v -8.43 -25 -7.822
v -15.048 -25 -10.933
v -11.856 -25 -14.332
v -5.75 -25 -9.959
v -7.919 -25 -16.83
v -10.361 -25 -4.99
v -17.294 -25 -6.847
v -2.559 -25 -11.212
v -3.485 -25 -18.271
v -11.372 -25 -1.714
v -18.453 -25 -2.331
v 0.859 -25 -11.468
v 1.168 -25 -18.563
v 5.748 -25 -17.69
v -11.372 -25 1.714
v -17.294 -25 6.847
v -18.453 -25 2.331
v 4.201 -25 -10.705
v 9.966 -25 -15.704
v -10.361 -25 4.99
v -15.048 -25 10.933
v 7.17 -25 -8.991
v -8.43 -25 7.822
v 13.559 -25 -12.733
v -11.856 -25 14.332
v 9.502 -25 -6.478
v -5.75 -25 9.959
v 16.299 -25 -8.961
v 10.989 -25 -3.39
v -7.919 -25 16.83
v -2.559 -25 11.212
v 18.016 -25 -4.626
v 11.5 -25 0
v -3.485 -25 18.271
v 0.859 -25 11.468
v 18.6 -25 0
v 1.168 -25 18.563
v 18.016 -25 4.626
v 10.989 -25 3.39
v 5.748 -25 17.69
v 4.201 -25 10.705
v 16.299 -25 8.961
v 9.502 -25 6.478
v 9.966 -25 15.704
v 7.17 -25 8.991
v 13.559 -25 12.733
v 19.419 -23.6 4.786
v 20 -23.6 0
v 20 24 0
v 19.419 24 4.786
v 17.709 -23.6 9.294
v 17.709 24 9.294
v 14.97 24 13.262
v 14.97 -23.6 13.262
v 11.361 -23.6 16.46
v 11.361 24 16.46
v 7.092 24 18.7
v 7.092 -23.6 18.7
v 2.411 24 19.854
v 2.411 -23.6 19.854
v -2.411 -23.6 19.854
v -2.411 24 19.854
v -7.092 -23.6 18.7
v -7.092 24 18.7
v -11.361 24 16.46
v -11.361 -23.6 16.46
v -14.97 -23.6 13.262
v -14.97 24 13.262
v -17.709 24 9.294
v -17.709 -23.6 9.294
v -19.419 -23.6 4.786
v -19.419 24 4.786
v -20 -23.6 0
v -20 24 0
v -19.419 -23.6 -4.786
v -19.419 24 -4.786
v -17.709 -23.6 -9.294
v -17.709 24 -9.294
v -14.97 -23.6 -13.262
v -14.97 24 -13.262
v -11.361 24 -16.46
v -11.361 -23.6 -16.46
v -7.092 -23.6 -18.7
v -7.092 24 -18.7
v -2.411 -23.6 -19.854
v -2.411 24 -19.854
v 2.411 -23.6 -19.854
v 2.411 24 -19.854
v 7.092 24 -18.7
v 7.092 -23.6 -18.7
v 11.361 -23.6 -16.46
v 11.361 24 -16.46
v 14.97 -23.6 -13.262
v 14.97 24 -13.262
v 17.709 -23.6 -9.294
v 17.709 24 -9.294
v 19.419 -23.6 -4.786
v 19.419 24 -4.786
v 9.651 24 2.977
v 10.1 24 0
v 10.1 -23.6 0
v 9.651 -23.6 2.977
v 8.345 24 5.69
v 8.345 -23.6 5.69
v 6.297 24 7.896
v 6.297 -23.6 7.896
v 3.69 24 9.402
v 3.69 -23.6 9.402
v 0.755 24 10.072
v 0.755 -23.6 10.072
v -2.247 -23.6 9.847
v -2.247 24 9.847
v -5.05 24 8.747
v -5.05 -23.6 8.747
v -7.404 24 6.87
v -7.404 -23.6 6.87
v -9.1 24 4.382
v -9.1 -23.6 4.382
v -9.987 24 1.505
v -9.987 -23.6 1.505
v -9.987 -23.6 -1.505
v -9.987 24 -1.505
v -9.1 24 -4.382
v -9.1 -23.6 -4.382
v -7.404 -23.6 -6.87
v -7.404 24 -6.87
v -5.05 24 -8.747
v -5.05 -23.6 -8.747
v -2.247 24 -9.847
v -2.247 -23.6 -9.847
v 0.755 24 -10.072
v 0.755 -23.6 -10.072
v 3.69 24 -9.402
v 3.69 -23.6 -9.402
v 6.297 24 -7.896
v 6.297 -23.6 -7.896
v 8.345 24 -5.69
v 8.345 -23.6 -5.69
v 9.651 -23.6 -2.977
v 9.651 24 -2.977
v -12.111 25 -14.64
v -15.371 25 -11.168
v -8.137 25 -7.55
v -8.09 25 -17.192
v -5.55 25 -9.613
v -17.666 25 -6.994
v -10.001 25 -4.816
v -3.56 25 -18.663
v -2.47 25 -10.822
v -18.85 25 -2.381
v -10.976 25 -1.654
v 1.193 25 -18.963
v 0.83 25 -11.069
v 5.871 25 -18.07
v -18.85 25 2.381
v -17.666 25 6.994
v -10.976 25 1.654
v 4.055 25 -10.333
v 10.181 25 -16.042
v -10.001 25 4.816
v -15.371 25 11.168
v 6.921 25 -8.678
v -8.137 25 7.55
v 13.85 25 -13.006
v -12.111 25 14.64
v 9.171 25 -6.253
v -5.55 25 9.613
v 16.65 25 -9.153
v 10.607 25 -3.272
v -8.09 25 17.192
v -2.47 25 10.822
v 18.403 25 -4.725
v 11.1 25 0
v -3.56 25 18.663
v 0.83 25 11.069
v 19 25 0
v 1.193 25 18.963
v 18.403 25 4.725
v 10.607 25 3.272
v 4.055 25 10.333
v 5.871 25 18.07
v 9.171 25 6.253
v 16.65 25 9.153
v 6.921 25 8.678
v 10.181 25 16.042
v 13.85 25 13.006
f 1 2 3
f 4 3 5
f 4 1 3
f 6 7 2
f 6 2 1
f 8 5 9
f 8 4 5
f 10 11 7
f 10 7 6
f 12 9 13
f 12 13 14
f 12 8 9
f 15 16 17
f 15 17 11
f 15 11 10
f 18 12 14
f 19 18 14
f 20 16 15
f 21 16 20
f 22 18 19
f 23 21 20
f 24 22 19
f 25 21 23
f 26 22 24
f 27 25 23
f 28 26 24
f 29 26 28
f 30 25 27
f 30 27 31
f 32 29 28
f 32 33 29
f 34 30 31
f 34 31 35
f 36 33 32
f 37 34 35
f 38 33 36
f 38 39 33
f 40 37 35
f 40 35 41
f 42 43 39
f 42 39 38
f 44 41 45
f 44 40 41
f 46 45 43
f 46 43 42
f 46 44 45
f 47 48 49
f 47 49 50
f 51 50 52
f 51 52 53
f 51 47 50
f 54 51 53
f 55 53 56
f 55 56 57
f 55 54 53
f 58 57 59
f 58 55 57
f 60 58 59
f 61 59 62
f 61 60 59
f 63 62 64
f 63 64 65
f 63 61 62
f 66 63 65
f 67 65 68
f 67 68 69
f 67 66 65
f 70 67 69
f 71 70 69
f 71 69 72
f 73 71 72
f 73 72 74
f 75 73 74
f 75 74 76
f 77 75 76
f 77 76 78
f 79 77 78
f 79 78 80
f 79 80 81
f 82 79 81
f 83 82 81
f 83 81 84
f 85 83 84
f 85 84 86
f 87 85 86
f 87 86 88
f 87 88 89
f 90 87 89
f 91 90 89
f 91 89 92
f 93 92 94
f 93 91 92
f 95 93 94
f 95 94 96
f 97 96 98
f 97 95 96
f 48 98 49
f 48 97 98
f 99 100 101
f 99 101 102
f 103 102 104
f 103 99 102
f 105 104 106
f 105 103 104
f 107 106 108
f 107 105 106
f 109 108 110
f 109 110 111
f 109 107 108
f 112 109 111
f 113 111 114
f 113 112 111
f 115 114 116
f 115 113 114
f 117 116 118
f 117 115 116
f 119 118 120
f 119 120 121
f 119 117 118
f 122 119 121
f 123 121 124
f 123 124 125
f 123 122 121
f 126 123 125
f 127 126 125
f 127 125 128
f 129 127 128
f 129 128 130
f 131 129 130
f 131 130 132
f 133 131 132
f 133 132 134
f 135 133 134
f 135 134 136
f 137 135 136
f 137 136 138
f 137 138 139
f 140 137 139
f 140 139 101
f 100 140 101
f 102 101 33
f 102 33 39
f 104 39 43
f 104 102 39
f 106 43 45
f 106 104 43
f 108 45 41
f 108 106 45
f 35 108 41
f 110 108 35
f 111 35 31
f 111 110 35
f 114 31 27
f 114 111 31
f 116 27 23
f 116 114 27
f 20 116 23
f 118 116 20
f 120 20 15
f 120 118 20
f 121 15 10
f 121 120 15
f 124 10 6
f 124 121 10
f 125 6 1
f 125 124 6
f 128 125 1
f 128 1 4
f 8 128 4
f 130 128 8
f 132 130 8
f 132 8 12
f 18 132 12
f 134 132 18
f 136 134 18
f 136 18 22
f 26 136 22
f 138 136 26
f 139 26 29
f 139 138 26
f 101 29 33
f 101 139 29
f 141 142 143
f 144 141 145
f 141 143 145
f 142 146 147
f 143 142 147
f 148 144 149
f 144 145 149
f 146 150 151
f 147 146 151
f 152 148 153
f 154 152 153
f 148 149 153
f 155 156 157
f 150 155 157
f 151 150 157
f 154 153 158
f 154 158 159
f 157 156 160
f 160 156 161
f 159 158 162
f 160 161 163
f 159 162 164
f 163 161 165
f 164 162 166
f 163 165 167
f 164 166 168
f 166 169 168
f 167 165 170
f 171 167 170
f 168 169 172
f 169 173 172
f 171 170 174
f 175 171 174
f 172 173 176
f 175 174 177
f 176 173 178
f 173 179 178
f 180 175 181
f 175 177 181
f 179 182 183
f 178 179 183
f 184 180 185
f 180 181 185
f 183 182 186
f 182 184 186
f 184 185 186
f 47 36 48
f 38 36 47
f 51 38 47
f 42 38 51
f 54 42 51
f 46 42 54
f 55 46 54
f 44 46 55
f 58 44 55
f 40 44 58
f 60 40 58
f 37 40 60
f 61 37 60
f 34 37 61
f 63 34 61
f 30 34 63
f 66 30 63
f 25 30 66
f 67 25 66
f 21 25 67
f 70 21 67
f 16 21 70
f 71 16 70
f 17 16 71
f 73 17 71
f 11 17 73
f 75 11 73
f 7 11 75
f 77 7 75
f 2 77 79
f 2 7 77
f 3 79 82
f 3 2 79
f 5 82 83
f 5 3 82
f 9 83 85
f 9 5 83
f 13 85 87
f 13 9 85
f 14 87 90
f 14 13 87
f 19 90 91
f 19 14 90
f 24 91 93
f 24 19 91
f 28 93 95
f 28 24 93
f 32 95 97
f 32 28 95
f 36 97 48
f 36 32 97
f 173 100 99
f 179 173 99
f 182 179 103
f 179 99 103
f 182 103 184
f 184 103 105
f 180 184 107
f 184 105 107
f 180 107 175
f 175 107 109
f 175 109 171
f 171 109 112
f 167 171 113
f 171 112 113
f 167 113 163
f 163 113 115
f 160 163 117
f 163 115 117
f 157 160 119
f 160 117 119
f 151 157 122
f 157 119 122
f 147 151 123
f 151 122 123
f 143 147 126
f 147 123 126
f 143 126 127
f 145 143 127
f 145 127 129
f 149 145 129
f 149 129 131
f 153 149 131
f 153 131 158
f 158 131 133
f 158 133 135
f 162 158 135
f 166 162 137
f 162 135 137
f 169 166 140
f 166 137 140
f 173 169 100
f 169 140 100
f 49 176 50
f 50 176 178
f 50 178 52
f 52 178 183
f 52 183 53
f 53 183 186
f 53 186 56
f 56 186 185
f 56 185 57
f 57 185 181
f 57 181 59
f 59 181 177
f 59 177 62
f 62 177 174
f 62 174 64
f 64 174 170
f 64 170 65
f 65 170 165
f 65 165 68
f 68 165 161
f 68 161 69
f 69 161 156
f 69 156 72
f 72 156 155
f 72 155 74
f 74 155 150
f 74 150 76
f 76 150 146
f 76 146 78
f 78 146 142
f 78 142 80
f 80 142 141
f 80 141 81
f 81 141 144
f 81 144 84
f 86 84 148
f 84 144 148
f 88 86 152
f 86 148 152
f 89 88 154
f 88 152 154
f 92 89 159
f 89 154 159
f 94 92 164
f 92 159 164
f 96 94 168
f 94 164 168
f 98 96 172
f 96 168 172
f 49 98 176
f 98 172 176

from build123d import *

# Parameters (mm, degrees)
F0_R     = 20
F0_R_2   = 10.1
F1_DEPTH = 25
F2_SIZE2 = 1.4
F2_SIZE  = 1.4
F3_SIZE2 = 1
F3_SIZE  = 1


with BuildPart() as f1:
    # F0 (on Front) → F1 (new body, symmetric)
    with BuildSketch(Plane.XZ):
        Circle(F0_R)
        Circle(F0_R_2, mode=Mode.SUBTRACT)
    extrude(amount=F1_DEPTH, both=True)

    # F2
    f2_edges = [f1.edges().sort_by_distance(p)[0] for p in [
        (-20, -25, 0),
        (-10.1, -25, 0),
    ]]
    chamfer(f2_edges, length=F2_SIZE, length2=F2_SIZE2)

    # F3
    f3_edges = [f1.edges().sort_by_distance(p)[0] for p in [
        (-10.1, 25, 0),
        (-20, 25, 0),
    ]]
    chamfer(f3_edges, length=F3_SIZE, length2=F3_SIZE2)


solid = f1.part
